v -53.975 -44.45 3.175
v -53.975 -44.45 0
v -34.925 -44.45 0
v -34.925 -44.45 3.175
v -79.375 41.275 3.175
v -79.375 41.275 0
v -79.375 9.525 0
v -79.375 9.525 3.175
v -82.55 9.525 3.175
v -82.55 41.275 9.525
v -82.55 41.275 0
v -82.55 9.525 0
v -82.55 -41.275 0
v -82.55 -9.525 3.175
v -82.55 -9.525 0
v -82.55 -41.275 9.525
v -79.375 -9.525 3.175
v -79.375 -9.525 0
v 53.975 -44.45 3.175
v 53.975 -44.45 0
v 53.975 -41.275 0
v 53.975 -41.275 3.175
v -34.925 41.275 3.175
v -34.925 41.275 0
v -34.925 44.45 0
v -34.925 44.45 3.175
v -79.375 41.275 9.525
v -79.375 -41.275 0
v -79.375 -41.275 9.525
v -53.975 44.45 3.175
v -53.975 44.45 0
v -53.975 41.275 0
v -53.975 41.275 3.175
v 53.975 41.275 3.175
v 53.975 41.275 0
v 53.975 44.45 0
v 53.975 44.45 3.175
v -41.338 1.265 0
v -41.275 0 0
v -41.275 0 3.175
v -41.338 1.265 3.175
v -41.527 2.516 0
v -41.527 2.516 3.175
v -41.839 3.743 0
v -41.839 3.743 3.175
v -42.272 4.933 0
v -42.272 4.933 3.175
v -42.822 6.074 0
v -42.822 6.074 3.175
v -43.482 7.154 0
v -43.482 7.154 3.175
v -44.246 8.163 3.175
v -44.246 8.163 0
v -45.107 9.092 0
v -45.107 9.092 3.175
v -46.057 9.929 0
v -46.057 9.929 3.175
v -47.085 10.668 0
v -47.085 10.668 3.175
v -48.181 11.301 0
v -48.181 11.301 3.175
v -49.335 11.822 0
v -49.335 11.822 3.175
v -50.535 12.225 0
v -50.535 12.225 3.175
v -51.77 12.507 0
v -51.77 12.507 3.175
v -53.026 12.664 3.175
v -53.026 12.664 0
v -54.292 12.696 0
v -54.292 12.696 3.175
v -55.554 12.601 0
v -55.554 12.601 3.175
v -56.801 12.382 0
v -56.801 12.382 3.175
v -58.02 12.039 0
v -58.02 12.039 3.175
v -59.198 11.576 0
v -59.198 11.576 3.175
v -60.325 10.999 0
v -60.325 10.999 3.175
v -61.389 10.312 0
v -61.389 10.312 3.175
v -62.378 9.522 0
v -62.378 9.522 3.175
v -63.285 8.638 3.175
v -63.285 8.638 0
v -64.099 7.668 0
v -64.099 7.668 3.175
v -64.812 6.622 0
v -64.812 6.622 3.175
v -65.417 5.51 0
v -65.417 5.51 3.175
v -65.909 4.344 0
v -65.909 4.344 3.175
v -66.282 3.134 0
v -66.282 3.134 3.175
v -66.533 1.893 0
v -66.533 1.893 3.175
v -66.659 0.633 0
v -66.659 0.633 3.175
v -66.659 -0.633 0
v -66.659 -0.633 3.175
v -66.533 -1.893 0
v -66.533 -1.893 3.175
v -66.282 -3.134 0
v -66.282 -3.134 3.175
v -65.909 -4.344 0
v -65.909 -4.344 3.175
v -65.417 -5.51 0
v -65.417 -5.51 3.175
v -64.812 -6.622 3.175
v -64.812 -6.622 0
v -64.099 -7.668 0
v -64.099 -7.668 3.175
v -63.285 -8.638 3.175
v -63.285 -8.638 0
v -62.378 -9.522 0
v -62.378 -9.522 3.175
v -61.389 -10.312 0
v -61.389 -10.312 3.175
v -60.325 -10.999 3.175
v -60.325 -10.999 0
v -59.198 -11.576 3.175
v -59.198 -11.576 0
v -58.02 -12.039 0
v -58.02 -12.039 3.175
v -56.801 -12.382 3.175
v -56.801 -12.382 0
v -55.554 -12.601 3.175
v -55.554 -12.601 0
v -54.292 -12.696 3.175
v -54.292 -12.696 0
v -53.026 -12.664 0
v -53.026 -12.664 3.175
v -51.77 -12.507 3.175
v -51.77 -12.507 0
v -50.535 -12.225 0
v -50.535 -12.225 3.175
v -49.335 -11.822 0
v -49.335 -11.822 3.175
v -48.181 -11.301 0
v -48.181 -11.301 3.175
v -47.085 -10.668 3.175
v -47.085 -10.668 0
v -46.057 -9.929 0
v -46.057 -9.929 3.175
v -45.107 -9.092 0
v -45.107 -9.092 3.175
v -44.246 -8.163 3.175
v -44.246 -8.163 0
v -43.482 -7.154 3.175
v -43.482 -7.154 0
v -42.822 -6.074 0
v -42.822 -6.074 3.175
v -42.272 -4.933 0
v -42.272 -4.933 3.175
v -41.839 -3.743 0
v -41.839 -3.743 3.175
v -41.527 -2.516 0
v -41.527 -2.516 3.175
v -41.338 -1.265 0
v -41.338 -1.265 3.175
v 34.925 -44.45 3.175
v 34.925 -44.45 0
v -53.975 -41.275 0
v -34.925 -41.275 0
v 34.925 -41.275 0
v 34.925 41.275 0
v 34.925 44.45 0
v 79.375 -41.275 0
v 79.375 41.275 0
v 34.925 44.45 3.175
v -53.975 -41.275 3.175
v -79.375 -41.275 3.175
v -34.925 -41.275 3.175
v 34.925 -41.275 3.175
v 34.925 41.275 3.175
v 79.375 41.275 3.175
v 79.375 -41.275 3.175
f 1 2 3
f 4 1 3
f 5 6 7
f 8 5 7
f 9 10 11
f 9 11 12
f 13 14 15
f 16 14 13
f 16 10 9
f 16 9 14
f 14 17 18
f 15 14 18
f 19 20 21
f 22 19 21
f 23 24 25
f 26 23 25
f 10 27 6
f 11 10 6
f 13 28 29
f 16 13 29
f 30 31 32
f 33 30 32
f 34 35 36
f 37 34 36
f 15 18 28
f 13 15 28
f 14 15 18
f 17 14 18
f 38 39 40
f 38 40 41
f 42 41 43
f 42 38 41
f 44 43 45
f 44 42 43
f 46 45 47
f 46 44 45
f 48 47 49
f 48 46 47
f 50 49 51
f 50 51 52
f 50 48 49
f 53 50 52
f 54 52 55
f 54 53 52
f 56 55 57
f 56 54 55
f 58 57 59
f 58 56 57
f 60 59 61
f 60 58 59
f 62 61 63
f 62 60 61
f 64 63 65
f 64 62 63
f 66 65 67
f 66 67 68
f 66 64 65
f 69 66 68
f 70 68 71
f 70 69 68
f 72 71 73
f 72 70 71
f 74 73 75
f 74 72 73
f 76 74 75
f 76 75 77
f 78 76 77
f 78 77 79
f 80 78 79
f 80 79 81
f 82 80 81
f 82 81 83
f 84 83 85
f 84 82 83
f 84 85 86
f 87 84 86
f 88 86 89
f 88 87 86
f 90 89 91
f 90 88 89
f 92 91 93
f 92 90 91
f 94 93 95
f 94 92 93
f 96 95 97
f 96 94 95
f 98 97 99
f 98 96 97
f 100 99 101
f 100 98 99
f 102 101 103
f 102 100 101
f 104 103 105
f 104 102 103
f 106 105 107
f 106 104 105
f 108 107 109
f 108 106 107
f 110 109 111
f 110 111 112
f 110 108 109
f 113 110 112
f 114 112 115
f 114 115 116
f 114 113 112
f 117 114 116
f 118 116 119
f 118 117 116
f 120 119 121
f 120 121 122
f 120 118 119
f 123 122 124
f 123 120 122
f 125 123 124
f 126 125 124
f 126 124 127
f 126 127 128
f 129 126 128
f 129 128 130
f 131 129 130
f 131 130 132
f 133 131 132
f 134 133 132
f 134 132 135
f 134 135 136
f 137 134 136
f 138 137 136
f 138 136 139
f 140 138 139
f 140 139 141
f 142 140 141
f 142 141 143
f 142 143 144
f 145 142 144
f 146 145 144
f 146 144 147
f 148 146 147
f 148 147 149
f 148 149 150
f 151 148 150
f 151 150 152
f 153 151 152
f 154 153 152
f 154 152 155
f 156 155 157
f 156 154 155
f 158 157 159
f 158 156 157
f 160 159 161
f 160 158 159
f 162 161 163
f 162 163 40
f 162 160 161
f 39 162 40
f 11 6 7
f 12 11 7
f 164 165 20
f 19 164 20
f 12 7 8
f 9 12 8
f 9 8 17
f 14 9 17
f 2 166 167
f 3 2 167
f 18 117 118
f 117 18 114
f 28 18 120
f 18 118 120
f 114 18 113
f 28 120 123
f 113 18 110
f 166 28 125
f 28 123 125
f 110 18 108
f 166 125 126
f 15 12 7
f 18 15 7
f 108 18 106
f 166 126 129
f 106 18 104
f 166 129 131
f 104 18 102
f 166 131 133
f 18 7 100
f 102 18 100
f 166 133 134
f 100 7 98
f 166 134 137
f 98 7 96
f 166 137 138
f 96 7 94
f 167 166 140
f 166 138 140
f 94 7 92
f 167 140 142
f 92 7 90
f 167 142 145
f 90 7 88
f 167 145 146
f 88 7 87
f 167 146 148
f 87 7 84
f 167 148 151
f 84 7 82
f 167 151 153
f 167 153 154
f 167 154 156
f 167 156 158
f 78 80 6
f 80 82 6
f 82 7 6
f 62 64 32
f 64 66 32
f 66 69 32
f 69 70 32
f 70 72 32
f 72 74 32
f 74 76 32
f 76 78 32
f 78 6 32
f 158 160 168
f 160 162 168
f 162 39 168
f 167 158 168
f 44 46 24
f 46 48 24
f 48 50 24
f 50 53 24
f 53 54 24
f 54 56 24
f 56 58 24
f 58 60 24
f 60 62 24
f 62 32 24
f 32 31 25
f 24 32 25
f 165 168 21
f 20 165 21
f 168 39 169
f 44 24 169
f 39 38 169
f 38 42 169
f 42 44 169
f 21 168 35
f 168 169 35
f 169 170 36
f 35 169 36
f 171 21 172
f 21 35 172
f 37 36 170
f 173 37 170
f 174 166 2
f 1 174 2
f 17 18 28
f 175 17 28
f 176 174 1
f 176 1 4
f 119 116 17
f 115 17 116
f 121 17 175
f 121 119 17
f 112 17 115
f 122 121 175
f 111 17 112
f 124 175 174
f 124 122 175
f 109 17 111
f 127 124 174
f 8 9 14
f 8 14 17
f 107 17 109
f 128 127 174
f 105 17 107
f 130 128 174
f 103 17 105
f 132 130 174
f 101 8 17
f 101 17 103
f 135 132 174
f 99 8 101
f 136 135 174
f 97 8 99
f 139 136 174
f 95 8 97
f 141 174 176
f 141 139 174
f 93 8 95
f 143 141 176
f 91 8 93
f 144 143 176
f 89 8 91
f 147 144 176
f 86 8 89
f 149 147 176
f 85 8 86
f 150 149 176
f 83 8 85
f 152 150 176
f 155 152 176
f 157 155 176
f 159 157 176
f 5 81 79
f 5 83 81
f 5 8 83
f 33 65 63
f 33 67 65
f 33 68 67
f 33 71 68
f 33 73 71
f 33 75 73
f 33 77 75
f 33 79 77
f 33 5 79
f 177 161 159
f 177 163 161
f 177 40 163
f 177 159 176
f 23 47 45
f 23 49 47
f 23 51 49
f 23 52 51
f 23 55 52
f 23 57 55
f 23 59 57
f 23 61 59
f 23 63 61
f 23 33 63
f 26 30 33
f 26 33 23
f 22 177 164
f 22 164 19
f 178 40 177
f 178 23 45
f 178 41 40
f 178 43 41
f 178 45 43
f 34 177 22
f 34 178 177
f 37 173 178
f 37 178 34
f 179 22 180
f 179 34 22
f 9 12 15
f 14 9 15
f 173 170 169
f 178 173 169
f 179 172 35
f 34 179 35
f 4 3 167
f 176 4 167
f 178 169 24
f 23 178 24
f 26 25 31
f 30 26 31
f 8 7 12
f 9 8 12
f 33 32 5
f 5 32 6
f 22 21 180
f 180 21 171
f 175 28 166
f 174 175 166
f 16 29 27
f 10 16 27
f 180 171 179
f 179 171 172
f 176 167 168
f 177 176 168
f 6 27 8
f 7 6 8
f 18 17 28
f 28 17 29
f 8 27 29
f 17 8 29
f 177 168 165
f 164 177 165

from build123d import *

# Parameters (mm, degrees)
F1_R     = 12.7
F2_DEPTH = 3.175
F3_W     = 31.75
F3_H     = 3.175
F4_DEPTH = 3.175


# Not quite as in the source:
# - a variable given as a bare number and used for a length is read in inches; the dataset says mm whatever the document's units were


with BuildPart() as f2:
    # F1 (on Top) → F2 (new body)
    with BuildSketch(Plane.XY):
        Polygon((-53.975, 41.275), (-79.375, 41.275), (-79.375, 9.525), (-82.55, 9.525), (-82.55, 0), (-82.55, -9.525), (-79.375, -9.525), (-79.375, -41.275), (-53.975, -41.275), (-53.975, -44.45), (-34.925, -44.45), (-34.925, -41.275), (34.925, -41.275), (34.925, -44.45), (53.975, -44.45), (53.975, -41.275), (79.375, -41.275), (79.375, 41.275), (53.975, 41.275), (53.975, 44.45), (34.925, 44.45), (34.925, 41.275), (-34.925, 41.275), (-34.925, 44.45), (-53.975, 44.45), align=None)
        with Locations((-53.975, 0)):
            Circle(F1_R, mode=Mode.SUBTRACT)
    extrude(amount=F2_DEPTH)


with BuildPart() as f4:
    # F3 (on face) → F4 (new body)
    with BuildSketch(Plane(origin=(-79.375, 0, 0), x_dir=(0, -1, 0), z_dir=(-1, 0, 0))):
        Polygon((-41.275, 9.525), (-41.275, 3.175), (-9.525, 3.175), (9.525, 3.175), (9.525, 0), (41.275, 0), (41.275, 9.525), align=None)
        with Locations((-25.4, 1.5875)):
            Rectangle(F3_W, F3_H)
    extrude(amount=F4_DEPTH)


solid = Compound([f2.part, f4.part])
